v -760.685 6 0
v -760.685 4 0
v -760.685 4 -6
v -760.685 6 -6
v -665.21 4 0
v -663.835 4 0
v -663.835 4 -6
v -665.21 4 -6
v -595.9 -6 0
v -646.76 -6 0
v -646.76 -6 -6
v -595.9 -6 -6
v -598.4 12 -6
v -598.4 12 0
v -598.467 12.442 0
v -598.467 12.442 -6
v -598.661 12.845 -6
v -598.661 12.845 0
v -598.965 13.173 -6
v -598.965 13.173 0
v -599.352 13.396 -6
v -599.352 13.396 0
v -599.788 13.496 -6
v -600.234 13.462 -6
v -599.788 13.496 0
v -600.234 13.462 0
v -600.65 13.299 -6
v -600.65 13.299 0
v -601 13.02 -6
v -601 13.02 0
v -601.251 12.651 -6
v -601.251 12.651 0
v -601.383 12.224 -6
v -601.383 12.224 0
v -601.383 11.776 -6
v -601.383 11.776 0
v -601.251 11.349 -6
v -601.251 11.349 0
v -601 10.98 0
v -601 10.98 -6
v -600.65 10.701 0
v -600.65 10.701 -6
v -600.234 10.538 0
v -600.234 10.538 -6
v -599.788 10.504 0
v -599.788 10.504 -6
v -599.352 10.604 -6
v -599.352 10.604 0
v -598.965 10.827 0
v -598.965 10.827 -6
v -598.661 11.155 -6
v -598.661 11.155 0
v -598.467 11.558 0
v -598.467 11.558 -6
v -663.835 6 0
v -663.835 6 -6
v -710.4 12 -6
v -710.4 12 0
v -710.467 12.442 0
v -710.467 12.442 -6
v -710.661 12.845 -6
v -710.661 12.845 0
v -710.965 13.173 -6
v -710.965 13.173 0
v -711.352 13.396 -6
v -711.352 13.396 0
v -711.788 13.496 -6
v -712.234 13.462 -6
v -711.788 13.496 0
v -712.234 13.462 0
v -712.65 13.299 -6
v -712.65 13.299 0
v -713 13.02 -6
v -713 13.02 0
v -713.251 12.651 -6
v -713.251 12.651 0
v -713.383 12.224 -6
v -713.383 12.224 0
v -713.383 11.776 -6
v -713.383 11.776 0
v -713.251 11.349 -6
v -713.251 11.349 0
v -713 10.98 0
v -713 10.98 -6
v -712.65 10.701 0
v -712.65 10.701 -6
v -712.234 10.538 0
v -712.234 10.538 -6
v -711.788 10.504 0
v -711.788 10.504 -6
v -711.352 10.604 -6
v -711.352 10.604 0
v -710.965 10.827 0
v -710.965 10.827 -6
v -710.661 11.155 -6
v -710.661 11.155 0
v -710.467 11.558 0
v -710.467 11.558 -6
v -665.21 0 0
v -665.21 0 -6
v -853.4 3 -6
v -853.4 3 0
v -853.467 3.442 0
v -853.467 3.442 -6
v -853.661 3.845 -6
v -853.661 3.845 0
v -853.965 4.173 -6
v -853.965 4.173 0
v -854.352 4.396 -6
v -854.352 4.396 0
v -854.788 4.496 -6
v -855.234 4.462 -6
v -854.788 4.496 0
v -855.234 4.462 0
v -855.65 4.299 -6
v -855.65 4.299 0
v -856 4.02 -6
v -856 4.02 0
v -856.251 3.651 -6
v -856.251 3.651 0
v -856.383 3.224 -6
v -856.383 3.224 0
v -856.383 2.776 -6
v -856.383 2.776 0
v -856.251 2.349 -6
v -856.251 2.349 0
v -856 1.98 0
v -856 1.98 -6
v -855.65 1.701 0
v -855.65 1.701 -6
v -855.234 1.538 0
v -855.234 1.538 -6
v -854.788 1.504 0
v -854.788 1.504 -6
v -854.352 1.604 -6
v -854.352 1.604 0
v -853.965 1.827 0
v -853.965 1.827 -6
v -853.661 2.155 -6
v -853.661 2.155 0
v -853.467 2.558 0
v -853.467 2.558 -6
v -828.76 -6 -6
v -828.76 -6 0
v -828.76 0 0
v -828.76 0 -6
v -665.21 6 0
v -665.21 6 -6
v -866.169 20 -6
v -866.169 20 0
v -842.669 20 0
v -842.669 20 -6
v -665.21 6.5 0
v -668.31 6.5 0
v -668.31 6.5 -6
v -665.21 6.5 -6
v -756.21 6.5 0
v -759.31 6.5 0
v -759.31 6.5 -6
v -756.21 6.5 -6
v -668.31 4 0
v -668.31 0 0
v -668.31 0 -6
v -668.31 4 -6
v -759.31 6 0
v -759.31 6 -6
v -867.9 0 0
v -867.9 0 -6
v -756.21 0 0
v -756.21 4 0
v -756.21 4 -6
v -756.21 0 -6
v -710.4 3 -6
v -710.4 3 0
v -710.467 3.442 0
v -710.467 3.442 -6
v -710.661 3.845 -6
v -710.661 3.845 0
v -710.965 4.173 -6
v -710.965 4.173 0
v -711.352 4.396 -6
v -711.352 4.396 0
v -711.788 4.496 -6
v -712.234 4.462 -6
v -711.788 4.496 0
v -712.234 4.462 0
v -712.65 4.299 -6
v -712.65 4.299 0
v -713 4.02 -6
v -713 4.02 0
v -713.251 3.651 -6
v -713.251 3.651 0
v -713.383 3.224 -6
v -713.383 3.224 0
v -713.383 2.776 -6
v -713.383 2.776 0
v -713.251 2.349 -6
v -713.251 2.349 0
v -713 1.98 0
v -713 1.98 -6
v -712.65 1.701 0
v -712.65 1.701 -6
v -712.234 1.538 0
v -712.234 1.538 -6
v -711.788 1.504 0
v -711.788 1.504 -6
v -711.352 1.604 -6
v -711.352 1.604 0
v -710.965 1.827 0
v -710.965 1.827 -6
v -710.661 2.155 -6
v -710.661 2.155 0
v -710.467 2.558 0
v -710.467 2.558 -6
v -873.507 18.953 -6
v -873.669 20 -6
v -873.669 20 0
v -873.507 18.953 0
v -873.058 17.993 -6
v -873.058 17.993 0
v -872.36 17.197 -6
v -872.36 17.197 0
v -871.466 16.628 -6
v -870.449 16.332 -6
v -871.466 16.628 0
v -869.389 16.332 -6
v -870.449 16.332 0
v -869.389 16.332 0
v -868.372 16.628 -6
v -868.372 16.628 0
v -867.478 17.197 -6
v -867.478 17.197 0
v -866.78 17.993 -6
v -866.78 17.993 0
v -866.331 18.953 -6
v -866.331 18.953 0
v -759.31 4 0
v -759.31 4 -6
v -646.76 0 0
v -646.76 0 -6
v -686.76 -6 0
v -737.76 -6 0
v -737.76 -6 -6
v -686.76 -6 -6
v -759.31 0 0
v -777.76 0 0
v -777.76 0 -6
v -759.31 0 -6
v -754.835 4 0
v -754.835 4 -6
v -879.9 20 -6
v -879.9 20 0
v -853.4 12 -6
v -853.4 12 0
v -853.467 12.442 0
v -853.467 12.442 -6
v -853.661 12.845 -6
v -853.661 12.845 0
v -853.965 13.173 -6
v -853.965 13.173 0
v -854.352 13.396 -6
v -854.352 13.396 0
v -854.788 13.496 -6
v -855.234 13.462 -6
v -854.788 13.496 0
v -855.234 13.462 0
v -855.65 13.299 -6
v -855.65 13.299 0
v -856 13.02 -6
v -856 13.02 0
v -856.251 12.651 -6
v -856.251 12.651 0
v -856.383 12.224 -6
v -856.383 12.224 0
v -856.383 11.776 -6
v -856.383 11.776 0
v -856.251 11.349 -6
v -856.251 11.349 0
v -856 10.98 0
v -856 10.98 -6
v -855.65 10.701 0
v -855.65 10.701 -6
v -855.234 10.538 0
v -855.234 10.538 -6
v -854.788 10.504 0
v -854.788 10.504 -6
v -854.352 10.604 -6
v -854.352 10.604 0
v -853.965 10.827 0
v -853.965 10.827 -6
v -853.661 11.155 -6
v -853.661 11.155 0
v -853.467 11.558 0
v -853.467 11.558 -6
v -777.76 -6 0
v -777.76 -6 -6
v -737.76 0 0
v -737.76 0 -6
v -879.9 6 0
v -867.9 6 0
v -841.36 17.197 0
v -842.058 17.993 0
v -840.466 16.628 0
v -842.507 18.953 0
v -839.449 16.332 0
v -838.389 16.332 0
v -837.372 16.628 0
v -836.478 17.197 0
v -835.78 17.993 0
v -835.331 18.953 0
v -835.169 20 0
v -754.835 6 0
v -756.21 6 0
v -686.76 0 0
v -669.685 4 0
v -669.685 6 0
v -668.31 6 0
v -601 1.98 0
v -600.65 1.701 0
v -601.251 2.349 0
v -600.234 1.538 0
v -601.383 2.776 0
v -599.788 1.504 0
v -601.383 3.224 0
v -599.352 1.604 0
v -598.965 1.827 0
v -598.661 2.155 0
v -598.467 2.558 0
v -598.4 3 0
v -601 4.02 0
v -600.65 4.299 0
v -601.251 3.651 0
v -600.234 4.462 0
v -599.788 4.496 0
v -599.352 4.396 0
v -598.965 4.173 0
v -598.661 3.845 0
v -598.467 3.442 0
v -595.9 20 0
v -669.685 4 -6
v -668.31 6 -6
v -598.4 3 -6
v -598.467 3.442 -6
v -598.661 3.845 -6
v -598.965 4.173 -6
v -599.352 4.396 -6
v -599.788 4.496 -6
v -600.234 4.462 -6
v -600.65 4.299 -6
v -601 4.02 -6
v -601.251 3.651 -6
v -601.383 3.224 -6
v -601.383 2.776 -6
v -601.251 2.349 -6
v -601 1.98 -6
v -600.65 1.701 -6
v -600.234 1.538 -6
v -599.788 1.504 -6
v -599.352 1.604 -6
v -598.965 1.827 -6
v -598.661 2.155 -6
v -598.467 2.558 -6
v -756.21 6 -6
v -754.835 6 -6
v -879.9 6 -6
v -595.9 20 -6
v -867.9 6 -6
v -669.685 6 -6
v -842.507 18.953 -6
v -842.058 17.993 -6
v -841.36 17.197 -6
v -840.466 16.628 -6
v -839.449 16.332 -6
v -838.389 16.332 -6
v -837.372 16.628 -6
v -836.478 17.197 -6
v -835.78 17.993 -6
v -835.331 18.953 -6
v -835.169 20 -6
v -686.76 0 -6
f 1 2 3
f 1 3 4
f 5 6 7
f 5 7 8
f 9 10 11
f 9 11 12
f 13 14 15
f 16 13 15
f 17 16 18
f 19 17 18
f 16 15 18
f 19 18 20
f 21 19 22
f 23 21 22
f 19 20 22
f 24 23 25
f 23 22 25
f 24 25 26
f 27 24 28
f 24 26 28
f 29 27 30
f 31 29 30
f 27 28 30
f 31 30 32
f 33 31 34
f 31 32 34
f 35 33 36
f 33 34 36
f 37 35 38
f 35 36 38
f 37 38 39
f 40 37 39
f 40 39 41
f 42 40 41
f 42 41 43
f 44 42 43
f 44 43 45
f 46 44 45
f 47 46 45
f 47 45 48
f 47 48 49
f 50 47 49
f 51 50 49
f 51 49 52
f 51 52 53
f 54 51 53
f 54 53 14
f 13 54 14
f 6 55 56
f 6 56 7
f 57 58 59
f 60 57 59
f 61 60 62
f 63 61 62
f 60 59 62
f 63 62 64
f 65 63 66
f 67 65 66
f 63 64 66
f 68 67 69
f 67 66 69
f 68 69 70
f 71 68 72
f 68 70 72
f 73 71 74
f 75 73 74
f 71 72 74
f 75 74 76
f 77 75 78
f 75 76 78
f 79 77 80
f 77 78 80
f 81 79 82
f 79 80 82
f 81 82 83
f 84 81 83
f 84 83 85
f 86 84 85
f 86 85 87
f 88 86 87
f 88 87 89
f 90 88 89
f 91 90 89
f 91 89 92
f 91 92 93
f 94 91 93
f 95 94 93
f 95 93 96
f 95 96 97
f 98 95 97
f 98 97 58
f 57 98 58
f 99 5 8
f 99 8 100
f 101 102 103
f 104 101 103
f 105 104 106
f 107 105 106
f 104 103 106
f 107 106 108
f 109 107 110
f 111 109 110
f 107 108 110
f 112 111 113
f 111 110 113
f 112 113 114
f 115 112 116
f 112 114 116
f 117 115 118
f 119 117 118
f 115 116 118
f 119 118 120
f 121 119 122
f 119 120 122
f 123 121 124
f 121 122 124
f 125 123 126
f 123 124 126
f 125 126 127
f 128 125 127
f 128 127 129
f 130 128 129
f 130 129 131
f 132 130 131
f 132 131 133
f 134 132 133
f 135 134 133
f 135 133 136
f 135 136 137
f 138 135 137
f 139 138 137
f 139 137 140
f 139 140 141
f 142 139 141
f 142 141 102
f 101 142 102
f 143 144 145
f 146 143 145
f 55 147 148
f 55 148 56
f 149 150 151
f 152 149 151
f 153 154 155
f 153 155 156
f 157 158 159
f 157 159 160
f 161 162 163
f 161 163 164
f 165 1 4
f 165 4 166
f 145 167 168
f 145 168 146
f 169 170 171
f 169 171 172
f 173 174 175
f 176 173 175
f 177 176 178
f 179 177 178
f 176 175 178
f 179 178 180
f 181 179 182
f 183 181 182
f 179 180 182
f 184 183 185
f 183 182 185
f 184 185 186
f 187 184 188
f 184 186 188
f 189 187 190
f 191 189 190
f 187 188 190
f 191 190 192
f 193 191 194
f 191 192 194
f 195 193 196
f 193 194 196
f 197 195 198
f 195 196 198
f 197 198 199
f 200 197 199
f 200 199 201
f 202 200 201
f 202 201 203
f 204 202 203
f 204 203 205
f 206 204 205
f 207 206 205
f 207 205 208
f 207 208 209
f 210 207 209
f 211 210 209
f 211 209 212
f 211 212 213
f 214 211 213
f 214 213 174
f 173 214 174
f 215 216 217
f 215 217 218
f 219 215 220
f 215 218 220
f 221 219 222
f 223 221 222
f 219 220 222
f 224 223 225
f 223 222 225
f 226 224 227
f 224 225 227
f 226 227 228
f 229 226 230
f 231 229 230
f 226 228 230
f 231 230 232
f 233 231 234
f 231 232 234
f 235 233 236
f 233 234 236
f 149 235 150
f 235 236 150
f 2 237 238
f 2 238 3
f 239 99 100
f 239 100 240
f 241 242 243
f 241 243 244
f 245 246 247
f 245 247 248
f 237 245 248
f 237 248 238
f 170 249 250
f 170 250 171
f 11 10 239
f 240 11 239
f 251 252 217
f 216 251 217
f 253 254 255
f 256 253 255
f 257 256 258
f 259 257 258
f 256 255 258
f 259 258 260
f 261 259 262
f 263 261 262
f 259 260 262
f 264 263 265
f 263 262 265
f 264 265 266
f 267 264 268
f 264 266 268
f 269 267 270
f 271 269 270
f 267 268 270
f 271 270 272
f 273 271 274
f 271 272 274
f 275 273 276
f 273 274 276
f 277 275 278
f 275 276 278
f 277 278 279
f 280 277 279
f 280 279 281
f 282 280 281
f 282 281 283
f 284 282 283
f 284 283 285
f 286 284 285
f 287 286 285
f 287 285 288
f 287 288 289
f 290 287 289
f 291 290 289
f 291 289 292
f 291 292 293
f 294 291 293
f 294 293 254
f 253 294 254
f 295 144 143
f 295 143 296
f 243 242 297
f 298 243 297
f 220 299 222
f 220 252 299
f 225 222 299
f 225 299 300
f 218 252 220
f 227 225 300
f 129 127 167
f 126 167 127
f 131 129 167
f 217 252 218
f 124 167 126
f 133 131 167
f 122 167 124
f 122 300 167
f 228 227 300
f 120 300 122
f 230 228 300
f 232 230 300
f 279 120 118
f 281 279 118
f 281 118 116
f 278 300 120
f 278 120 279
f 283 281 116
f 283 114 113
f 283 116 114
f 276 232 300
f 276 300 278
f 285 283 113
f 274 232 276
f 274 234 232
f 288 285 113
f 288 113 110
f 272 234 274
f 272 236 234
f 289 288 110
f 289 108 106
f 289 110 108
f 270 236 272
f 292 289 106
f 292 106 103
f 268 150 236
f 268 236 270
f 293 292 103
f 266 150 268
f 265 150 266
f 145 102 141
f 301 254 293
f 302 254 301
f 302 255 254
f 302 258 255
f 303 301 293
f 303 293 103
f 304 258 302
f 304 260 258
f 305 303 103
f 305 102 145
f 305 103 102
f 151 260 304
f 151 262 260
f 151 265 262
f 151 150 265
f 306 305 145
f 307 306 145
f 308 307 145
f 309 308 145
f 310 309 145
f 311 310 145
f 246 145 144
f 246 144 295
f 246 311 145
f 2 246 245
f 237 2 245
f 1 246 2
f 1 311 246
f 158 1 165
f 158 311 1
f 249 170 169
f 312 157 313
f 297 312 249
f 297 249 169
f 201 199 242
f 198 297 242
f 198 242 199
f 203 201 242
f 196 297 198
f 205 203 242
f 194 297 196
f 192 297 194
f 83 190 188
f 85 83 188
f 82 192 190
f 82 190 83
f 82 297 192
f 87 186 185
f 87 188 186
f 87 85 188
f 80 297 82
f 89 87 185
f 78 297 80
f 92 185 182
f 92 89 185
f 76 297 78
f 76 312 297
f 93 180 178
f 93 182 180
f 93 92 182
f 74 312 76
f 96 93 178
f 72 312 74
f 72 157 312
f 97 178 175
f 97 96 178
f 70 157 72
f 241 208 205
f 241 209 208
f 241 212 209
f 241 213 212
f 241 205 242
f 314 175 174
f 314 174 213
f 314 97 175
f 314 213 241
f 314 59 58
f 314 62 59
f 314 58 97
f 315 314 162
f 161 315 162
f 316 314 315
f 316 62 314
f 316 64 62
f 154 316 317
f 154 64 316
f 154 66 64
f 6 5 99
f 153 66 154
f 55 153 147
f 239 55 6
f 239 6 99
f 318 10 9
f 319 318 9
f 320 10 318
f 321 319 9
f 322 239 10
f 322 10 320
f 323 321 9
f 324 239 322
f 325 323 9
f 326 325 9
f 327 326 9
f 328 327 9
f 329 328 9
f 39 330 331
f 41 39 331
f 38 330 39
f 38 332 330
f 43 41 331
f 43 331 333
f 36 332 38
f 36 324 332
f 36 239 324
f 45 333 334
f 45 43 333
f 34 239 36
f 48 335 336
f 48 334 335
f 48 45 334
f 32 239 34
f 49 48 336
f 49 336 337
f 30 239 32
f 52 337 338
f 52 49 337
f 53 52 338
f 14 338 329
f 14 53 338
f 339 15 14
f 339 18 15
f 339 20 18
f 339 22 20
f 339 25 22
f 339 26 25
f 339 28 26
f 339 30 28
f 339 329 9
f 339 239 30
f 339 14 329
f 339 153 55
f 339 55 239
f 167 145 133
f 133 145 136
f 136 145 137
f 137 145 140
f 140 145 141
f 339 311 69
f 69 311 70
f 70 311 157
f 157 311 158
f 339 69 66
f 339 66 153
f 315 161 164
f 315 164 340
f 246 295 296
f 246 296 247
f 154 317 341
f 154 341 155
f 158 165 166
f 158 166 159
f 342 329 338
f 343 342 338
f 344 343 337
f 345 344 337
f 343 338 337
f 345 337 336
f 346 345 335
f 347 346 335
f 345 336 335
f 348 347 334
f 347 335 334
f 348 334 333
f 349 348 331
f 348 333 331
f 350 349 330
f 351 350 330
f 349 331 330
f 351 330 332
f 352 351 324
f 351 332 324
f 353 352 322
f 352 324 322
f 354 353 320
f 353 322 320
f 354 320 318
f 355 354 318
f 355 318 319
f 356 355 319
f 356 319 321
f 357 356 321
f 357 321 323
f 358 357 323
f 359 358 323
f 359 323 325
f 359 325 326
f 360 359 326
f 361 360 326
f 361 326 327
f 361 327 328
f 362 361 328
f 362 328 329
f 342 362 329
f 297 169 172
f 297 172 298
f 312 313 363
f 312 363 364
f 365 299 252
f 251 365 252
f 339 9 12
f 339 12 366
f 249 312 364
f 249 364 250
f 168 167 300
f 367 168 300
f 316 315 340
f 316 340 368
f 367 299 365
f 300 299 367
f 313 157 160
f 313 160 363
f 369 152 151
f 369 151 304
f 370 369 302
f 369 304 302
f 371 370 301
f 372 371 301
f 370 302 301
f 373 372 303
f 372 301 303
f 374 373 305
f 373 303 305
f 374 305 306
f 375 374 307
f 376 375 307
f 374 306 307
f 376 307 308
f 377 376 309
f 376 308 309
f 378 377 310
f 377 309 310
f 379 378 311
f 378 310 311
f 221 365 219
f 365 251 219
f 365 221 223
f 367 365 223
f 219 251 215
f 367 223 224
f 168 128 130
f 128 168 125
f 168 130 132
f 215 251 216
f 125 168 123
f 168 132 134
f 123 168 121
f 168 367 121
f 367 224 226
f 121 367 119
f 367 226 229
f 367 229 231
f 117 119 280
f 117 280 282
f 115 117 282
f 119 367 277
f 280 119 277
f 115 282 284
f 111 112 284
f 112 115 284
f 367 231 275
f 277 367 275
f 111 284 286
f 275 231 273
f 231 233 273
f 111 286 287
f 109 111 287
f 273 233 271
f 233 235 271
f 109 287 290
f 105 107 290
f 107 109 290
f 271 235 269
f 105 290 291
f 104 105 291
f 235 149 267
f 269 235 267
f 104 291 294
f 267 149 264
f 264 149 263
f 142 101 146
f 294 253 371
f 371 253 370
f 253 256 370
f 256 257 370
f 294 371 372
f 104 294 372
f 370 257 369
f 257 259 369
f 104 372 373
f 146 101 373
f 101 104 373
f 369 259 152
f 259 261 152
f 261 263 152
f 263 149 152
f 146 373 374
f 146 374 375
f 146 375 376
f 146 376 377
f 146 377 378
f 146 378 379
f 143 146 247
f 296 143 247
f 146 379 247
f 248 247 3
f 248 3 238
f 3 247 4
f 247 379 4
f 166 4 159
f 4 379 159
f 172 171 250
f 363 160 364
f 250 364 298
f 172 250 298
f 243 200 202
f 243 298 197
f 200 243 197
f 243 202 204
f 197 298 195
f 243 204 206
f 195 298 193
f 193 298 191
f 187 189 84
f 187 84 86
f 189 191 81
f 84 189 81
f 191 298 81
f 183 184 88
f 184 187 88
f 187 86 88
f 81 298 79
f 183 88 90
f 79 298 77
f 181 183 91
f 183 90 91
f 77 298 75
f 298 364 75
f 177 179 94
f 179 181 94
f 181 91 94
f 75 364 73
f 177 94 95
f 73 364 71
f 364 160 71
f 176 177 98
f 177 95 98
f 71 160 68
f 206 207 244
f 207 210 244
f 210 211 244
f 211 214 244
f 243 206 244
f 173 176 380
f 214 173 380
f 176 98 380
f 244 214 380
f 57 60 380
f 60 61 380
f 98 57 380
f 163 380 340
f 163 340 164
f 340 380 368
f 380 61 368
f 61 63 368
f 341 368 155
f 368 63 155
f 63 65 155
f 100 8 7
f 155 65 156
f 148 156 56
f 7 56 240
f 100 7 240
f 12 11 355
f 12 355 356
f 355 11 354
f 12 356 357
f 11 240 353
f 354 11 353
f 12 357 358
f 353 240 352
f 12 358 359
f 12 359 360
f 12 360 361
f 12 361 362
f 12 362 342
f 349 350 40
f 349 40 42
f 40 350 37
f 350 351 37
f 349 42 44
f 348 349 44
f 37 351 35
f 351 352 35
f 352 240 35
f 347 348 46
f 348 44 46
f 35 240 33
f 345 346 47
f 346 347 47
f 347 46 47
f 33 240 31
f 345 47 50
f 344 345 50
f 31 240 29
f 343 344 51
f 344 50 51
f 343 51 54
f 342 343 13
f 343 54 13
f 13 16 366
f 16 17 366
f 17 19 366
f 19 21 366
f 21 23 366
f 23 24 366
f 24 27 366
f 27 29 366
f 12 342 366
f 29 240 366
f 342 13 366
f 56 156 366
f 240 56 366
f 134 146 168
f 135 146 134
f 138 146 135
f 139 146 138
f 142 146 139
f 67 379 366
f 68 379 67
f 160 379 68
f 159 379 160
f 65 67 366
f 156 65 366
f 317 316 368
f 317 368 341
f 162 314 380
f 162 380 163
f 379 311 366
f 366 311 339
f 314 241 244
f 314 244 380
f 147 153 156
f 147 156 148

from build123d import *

# Parameters (mm, degrees)
SZKIC1_W                    = 284
SZKIC1_H                    = 26
DODANIE_WYCI_GNI_CIE1_DEPTH = 6
SZKIC5_W                    = 40
SZKIC5_H                    = 6
WYTNIJ_WYCI_GNI_CIE3_DEPTH  = 6
SZYK_LINIOWY1_COUNT         = 4
SZYK_LINIOWY1_PITCH         = 91
WYTNIJ_WYCI_GNI_CIE4_DEPTH  = 6
SZYK_LINIOWY2_COUNT         = 2
SZYK_LINIOWY2_PITCH         = 91
SZKIC9_W                    = 12
SZKIC9_H                    = 12
WYTNIJ_WYCI_GNI_CIE6_DEPTH  = 10
SZKIC10_R                   = 1.5
WYTNIJ_WYCI_GNI_CIE7_DEPTH  = 10
SZKIC12_R                   = 3.75
WYTNIJ_WYCI_GNI_CIE8_DEPTH  = 6


with BuildPart() as part:
    # Szkic1 → Dodanie-wyciągnięcie1 (new body)
    with BuildSketch(Plane.XY):
        with Locations((-737.9, 7)):
            Rectangle(SZKIC1_W, SZKIC1_H)
    extrude(amount=-DODANIE_WYCI_GNI_CIE1_DEPTH)

    # Szkic5 → Wytnij-wyciągnięcie3 (cut)
    with BuildSketch(Plane.XY):
        with Locations((-666.76, -3)):
            Rectangle(SZKIC5_W, SZKIC5_H)
    wytnij_wyci_gni_cie3 = extrude(amount=-WYTNIJ_WYCI_GNI_CIE3_DEPTH, mode=Mode.SUBTRACT)

    # Szyk liniowy1: Wytnij-wyciągnięcie3 ×4
    with Locations(*[(-i * SZYK_LINIOWY1_PITCH, 0, 0) for i in range(1, SZYK_LINIOWY1_COUNT)]):
        add(wytnij_wyci_gni_cie3, mode=Mode.SUBTRACT)

    # Szkic6 → Wytnij-wyciągnięcie4 (cut)
    with BuildSketch(Plane.XY):
        Polygon((-665.21, 0), (-668.31, 0), (-668.31, 4), (-669.685, 4), (-669.685, 6), (-668.31, 6), (-668.31, 6.5), (-665.21, 6.5), (-665.21, 6), (-663.835, 6), (-663.835, 4), (-665.21, 4), align=None)
    wytnij_wyci_gni_cie4 = extrude(amount=-WYTNIJ_WYCI_GNI_CIE4_DEPTH, mode=Mode.SUBTRACT)

    # Szyk liniowy2: Wytnij-wyciągnięcie4 ×2
    with Locations(*[(-i * SZYK_LINIOWY2_PITCH, 0, 0) for i in range(1, SZYK_LINIOWY2_COUNT)]):
        add(wytnij_wyci_gni_cie4, mode=Mode.SUBTRACT)

    # Szkic9 → Wytnij-wyciągnięcie6 (cut)
    with BuildSketch(Plane.XY):
        with Locations((-873.9, 0)):
            Rectangle(SZKIC9_W, SZKIC9_H)
    extrude(amount=-WYTNIJ_WYCI_GNI_CIE6_DEPTH, mode=Mode.SUBTRACT)

    # Szkic10 → Wytnij-wyciągnięcie7 (cut)
    with BuildSketch(Plane.XY):
        with Locations((-599.9, 3)):
            Circle(SZKIC10_R)
        with Locations((-599.9, 12)):
            Circle(SZKIC10_R)
        with Locations((-854.9, 3)):
            Circle(SZKIC10_R)
        with Locations((-854.9, 12)):
            Circle(SZKIC10_R)
        with Locations((-711.9, 3)):
            Circle(SZKIC10_R)
        with Locations((-711.9, 12)):
            Circle(SZKIC10_R)
    extrude(amount=-WYTNIJ_WYCI_GNI_CIE7_DEPTH, mode=Mode.SUBTRACT)

    # Szkic12 → Wytnij-wyciągnięcie8 (cut)
    with BuildSketch(Plane.XY):
        with Locations((-838.918997424, 20.044165404)):
            Circle(SZKIC12_R)
        with Locations((-869.918997424, 20.044165404)):
            Circle(SZKIC12_R)
    extrude(amount=-WYTNIJ_WYCI_GNI_CIE8_DEPTH, mode=Mode.SUBTRACT)


solid = part.part
